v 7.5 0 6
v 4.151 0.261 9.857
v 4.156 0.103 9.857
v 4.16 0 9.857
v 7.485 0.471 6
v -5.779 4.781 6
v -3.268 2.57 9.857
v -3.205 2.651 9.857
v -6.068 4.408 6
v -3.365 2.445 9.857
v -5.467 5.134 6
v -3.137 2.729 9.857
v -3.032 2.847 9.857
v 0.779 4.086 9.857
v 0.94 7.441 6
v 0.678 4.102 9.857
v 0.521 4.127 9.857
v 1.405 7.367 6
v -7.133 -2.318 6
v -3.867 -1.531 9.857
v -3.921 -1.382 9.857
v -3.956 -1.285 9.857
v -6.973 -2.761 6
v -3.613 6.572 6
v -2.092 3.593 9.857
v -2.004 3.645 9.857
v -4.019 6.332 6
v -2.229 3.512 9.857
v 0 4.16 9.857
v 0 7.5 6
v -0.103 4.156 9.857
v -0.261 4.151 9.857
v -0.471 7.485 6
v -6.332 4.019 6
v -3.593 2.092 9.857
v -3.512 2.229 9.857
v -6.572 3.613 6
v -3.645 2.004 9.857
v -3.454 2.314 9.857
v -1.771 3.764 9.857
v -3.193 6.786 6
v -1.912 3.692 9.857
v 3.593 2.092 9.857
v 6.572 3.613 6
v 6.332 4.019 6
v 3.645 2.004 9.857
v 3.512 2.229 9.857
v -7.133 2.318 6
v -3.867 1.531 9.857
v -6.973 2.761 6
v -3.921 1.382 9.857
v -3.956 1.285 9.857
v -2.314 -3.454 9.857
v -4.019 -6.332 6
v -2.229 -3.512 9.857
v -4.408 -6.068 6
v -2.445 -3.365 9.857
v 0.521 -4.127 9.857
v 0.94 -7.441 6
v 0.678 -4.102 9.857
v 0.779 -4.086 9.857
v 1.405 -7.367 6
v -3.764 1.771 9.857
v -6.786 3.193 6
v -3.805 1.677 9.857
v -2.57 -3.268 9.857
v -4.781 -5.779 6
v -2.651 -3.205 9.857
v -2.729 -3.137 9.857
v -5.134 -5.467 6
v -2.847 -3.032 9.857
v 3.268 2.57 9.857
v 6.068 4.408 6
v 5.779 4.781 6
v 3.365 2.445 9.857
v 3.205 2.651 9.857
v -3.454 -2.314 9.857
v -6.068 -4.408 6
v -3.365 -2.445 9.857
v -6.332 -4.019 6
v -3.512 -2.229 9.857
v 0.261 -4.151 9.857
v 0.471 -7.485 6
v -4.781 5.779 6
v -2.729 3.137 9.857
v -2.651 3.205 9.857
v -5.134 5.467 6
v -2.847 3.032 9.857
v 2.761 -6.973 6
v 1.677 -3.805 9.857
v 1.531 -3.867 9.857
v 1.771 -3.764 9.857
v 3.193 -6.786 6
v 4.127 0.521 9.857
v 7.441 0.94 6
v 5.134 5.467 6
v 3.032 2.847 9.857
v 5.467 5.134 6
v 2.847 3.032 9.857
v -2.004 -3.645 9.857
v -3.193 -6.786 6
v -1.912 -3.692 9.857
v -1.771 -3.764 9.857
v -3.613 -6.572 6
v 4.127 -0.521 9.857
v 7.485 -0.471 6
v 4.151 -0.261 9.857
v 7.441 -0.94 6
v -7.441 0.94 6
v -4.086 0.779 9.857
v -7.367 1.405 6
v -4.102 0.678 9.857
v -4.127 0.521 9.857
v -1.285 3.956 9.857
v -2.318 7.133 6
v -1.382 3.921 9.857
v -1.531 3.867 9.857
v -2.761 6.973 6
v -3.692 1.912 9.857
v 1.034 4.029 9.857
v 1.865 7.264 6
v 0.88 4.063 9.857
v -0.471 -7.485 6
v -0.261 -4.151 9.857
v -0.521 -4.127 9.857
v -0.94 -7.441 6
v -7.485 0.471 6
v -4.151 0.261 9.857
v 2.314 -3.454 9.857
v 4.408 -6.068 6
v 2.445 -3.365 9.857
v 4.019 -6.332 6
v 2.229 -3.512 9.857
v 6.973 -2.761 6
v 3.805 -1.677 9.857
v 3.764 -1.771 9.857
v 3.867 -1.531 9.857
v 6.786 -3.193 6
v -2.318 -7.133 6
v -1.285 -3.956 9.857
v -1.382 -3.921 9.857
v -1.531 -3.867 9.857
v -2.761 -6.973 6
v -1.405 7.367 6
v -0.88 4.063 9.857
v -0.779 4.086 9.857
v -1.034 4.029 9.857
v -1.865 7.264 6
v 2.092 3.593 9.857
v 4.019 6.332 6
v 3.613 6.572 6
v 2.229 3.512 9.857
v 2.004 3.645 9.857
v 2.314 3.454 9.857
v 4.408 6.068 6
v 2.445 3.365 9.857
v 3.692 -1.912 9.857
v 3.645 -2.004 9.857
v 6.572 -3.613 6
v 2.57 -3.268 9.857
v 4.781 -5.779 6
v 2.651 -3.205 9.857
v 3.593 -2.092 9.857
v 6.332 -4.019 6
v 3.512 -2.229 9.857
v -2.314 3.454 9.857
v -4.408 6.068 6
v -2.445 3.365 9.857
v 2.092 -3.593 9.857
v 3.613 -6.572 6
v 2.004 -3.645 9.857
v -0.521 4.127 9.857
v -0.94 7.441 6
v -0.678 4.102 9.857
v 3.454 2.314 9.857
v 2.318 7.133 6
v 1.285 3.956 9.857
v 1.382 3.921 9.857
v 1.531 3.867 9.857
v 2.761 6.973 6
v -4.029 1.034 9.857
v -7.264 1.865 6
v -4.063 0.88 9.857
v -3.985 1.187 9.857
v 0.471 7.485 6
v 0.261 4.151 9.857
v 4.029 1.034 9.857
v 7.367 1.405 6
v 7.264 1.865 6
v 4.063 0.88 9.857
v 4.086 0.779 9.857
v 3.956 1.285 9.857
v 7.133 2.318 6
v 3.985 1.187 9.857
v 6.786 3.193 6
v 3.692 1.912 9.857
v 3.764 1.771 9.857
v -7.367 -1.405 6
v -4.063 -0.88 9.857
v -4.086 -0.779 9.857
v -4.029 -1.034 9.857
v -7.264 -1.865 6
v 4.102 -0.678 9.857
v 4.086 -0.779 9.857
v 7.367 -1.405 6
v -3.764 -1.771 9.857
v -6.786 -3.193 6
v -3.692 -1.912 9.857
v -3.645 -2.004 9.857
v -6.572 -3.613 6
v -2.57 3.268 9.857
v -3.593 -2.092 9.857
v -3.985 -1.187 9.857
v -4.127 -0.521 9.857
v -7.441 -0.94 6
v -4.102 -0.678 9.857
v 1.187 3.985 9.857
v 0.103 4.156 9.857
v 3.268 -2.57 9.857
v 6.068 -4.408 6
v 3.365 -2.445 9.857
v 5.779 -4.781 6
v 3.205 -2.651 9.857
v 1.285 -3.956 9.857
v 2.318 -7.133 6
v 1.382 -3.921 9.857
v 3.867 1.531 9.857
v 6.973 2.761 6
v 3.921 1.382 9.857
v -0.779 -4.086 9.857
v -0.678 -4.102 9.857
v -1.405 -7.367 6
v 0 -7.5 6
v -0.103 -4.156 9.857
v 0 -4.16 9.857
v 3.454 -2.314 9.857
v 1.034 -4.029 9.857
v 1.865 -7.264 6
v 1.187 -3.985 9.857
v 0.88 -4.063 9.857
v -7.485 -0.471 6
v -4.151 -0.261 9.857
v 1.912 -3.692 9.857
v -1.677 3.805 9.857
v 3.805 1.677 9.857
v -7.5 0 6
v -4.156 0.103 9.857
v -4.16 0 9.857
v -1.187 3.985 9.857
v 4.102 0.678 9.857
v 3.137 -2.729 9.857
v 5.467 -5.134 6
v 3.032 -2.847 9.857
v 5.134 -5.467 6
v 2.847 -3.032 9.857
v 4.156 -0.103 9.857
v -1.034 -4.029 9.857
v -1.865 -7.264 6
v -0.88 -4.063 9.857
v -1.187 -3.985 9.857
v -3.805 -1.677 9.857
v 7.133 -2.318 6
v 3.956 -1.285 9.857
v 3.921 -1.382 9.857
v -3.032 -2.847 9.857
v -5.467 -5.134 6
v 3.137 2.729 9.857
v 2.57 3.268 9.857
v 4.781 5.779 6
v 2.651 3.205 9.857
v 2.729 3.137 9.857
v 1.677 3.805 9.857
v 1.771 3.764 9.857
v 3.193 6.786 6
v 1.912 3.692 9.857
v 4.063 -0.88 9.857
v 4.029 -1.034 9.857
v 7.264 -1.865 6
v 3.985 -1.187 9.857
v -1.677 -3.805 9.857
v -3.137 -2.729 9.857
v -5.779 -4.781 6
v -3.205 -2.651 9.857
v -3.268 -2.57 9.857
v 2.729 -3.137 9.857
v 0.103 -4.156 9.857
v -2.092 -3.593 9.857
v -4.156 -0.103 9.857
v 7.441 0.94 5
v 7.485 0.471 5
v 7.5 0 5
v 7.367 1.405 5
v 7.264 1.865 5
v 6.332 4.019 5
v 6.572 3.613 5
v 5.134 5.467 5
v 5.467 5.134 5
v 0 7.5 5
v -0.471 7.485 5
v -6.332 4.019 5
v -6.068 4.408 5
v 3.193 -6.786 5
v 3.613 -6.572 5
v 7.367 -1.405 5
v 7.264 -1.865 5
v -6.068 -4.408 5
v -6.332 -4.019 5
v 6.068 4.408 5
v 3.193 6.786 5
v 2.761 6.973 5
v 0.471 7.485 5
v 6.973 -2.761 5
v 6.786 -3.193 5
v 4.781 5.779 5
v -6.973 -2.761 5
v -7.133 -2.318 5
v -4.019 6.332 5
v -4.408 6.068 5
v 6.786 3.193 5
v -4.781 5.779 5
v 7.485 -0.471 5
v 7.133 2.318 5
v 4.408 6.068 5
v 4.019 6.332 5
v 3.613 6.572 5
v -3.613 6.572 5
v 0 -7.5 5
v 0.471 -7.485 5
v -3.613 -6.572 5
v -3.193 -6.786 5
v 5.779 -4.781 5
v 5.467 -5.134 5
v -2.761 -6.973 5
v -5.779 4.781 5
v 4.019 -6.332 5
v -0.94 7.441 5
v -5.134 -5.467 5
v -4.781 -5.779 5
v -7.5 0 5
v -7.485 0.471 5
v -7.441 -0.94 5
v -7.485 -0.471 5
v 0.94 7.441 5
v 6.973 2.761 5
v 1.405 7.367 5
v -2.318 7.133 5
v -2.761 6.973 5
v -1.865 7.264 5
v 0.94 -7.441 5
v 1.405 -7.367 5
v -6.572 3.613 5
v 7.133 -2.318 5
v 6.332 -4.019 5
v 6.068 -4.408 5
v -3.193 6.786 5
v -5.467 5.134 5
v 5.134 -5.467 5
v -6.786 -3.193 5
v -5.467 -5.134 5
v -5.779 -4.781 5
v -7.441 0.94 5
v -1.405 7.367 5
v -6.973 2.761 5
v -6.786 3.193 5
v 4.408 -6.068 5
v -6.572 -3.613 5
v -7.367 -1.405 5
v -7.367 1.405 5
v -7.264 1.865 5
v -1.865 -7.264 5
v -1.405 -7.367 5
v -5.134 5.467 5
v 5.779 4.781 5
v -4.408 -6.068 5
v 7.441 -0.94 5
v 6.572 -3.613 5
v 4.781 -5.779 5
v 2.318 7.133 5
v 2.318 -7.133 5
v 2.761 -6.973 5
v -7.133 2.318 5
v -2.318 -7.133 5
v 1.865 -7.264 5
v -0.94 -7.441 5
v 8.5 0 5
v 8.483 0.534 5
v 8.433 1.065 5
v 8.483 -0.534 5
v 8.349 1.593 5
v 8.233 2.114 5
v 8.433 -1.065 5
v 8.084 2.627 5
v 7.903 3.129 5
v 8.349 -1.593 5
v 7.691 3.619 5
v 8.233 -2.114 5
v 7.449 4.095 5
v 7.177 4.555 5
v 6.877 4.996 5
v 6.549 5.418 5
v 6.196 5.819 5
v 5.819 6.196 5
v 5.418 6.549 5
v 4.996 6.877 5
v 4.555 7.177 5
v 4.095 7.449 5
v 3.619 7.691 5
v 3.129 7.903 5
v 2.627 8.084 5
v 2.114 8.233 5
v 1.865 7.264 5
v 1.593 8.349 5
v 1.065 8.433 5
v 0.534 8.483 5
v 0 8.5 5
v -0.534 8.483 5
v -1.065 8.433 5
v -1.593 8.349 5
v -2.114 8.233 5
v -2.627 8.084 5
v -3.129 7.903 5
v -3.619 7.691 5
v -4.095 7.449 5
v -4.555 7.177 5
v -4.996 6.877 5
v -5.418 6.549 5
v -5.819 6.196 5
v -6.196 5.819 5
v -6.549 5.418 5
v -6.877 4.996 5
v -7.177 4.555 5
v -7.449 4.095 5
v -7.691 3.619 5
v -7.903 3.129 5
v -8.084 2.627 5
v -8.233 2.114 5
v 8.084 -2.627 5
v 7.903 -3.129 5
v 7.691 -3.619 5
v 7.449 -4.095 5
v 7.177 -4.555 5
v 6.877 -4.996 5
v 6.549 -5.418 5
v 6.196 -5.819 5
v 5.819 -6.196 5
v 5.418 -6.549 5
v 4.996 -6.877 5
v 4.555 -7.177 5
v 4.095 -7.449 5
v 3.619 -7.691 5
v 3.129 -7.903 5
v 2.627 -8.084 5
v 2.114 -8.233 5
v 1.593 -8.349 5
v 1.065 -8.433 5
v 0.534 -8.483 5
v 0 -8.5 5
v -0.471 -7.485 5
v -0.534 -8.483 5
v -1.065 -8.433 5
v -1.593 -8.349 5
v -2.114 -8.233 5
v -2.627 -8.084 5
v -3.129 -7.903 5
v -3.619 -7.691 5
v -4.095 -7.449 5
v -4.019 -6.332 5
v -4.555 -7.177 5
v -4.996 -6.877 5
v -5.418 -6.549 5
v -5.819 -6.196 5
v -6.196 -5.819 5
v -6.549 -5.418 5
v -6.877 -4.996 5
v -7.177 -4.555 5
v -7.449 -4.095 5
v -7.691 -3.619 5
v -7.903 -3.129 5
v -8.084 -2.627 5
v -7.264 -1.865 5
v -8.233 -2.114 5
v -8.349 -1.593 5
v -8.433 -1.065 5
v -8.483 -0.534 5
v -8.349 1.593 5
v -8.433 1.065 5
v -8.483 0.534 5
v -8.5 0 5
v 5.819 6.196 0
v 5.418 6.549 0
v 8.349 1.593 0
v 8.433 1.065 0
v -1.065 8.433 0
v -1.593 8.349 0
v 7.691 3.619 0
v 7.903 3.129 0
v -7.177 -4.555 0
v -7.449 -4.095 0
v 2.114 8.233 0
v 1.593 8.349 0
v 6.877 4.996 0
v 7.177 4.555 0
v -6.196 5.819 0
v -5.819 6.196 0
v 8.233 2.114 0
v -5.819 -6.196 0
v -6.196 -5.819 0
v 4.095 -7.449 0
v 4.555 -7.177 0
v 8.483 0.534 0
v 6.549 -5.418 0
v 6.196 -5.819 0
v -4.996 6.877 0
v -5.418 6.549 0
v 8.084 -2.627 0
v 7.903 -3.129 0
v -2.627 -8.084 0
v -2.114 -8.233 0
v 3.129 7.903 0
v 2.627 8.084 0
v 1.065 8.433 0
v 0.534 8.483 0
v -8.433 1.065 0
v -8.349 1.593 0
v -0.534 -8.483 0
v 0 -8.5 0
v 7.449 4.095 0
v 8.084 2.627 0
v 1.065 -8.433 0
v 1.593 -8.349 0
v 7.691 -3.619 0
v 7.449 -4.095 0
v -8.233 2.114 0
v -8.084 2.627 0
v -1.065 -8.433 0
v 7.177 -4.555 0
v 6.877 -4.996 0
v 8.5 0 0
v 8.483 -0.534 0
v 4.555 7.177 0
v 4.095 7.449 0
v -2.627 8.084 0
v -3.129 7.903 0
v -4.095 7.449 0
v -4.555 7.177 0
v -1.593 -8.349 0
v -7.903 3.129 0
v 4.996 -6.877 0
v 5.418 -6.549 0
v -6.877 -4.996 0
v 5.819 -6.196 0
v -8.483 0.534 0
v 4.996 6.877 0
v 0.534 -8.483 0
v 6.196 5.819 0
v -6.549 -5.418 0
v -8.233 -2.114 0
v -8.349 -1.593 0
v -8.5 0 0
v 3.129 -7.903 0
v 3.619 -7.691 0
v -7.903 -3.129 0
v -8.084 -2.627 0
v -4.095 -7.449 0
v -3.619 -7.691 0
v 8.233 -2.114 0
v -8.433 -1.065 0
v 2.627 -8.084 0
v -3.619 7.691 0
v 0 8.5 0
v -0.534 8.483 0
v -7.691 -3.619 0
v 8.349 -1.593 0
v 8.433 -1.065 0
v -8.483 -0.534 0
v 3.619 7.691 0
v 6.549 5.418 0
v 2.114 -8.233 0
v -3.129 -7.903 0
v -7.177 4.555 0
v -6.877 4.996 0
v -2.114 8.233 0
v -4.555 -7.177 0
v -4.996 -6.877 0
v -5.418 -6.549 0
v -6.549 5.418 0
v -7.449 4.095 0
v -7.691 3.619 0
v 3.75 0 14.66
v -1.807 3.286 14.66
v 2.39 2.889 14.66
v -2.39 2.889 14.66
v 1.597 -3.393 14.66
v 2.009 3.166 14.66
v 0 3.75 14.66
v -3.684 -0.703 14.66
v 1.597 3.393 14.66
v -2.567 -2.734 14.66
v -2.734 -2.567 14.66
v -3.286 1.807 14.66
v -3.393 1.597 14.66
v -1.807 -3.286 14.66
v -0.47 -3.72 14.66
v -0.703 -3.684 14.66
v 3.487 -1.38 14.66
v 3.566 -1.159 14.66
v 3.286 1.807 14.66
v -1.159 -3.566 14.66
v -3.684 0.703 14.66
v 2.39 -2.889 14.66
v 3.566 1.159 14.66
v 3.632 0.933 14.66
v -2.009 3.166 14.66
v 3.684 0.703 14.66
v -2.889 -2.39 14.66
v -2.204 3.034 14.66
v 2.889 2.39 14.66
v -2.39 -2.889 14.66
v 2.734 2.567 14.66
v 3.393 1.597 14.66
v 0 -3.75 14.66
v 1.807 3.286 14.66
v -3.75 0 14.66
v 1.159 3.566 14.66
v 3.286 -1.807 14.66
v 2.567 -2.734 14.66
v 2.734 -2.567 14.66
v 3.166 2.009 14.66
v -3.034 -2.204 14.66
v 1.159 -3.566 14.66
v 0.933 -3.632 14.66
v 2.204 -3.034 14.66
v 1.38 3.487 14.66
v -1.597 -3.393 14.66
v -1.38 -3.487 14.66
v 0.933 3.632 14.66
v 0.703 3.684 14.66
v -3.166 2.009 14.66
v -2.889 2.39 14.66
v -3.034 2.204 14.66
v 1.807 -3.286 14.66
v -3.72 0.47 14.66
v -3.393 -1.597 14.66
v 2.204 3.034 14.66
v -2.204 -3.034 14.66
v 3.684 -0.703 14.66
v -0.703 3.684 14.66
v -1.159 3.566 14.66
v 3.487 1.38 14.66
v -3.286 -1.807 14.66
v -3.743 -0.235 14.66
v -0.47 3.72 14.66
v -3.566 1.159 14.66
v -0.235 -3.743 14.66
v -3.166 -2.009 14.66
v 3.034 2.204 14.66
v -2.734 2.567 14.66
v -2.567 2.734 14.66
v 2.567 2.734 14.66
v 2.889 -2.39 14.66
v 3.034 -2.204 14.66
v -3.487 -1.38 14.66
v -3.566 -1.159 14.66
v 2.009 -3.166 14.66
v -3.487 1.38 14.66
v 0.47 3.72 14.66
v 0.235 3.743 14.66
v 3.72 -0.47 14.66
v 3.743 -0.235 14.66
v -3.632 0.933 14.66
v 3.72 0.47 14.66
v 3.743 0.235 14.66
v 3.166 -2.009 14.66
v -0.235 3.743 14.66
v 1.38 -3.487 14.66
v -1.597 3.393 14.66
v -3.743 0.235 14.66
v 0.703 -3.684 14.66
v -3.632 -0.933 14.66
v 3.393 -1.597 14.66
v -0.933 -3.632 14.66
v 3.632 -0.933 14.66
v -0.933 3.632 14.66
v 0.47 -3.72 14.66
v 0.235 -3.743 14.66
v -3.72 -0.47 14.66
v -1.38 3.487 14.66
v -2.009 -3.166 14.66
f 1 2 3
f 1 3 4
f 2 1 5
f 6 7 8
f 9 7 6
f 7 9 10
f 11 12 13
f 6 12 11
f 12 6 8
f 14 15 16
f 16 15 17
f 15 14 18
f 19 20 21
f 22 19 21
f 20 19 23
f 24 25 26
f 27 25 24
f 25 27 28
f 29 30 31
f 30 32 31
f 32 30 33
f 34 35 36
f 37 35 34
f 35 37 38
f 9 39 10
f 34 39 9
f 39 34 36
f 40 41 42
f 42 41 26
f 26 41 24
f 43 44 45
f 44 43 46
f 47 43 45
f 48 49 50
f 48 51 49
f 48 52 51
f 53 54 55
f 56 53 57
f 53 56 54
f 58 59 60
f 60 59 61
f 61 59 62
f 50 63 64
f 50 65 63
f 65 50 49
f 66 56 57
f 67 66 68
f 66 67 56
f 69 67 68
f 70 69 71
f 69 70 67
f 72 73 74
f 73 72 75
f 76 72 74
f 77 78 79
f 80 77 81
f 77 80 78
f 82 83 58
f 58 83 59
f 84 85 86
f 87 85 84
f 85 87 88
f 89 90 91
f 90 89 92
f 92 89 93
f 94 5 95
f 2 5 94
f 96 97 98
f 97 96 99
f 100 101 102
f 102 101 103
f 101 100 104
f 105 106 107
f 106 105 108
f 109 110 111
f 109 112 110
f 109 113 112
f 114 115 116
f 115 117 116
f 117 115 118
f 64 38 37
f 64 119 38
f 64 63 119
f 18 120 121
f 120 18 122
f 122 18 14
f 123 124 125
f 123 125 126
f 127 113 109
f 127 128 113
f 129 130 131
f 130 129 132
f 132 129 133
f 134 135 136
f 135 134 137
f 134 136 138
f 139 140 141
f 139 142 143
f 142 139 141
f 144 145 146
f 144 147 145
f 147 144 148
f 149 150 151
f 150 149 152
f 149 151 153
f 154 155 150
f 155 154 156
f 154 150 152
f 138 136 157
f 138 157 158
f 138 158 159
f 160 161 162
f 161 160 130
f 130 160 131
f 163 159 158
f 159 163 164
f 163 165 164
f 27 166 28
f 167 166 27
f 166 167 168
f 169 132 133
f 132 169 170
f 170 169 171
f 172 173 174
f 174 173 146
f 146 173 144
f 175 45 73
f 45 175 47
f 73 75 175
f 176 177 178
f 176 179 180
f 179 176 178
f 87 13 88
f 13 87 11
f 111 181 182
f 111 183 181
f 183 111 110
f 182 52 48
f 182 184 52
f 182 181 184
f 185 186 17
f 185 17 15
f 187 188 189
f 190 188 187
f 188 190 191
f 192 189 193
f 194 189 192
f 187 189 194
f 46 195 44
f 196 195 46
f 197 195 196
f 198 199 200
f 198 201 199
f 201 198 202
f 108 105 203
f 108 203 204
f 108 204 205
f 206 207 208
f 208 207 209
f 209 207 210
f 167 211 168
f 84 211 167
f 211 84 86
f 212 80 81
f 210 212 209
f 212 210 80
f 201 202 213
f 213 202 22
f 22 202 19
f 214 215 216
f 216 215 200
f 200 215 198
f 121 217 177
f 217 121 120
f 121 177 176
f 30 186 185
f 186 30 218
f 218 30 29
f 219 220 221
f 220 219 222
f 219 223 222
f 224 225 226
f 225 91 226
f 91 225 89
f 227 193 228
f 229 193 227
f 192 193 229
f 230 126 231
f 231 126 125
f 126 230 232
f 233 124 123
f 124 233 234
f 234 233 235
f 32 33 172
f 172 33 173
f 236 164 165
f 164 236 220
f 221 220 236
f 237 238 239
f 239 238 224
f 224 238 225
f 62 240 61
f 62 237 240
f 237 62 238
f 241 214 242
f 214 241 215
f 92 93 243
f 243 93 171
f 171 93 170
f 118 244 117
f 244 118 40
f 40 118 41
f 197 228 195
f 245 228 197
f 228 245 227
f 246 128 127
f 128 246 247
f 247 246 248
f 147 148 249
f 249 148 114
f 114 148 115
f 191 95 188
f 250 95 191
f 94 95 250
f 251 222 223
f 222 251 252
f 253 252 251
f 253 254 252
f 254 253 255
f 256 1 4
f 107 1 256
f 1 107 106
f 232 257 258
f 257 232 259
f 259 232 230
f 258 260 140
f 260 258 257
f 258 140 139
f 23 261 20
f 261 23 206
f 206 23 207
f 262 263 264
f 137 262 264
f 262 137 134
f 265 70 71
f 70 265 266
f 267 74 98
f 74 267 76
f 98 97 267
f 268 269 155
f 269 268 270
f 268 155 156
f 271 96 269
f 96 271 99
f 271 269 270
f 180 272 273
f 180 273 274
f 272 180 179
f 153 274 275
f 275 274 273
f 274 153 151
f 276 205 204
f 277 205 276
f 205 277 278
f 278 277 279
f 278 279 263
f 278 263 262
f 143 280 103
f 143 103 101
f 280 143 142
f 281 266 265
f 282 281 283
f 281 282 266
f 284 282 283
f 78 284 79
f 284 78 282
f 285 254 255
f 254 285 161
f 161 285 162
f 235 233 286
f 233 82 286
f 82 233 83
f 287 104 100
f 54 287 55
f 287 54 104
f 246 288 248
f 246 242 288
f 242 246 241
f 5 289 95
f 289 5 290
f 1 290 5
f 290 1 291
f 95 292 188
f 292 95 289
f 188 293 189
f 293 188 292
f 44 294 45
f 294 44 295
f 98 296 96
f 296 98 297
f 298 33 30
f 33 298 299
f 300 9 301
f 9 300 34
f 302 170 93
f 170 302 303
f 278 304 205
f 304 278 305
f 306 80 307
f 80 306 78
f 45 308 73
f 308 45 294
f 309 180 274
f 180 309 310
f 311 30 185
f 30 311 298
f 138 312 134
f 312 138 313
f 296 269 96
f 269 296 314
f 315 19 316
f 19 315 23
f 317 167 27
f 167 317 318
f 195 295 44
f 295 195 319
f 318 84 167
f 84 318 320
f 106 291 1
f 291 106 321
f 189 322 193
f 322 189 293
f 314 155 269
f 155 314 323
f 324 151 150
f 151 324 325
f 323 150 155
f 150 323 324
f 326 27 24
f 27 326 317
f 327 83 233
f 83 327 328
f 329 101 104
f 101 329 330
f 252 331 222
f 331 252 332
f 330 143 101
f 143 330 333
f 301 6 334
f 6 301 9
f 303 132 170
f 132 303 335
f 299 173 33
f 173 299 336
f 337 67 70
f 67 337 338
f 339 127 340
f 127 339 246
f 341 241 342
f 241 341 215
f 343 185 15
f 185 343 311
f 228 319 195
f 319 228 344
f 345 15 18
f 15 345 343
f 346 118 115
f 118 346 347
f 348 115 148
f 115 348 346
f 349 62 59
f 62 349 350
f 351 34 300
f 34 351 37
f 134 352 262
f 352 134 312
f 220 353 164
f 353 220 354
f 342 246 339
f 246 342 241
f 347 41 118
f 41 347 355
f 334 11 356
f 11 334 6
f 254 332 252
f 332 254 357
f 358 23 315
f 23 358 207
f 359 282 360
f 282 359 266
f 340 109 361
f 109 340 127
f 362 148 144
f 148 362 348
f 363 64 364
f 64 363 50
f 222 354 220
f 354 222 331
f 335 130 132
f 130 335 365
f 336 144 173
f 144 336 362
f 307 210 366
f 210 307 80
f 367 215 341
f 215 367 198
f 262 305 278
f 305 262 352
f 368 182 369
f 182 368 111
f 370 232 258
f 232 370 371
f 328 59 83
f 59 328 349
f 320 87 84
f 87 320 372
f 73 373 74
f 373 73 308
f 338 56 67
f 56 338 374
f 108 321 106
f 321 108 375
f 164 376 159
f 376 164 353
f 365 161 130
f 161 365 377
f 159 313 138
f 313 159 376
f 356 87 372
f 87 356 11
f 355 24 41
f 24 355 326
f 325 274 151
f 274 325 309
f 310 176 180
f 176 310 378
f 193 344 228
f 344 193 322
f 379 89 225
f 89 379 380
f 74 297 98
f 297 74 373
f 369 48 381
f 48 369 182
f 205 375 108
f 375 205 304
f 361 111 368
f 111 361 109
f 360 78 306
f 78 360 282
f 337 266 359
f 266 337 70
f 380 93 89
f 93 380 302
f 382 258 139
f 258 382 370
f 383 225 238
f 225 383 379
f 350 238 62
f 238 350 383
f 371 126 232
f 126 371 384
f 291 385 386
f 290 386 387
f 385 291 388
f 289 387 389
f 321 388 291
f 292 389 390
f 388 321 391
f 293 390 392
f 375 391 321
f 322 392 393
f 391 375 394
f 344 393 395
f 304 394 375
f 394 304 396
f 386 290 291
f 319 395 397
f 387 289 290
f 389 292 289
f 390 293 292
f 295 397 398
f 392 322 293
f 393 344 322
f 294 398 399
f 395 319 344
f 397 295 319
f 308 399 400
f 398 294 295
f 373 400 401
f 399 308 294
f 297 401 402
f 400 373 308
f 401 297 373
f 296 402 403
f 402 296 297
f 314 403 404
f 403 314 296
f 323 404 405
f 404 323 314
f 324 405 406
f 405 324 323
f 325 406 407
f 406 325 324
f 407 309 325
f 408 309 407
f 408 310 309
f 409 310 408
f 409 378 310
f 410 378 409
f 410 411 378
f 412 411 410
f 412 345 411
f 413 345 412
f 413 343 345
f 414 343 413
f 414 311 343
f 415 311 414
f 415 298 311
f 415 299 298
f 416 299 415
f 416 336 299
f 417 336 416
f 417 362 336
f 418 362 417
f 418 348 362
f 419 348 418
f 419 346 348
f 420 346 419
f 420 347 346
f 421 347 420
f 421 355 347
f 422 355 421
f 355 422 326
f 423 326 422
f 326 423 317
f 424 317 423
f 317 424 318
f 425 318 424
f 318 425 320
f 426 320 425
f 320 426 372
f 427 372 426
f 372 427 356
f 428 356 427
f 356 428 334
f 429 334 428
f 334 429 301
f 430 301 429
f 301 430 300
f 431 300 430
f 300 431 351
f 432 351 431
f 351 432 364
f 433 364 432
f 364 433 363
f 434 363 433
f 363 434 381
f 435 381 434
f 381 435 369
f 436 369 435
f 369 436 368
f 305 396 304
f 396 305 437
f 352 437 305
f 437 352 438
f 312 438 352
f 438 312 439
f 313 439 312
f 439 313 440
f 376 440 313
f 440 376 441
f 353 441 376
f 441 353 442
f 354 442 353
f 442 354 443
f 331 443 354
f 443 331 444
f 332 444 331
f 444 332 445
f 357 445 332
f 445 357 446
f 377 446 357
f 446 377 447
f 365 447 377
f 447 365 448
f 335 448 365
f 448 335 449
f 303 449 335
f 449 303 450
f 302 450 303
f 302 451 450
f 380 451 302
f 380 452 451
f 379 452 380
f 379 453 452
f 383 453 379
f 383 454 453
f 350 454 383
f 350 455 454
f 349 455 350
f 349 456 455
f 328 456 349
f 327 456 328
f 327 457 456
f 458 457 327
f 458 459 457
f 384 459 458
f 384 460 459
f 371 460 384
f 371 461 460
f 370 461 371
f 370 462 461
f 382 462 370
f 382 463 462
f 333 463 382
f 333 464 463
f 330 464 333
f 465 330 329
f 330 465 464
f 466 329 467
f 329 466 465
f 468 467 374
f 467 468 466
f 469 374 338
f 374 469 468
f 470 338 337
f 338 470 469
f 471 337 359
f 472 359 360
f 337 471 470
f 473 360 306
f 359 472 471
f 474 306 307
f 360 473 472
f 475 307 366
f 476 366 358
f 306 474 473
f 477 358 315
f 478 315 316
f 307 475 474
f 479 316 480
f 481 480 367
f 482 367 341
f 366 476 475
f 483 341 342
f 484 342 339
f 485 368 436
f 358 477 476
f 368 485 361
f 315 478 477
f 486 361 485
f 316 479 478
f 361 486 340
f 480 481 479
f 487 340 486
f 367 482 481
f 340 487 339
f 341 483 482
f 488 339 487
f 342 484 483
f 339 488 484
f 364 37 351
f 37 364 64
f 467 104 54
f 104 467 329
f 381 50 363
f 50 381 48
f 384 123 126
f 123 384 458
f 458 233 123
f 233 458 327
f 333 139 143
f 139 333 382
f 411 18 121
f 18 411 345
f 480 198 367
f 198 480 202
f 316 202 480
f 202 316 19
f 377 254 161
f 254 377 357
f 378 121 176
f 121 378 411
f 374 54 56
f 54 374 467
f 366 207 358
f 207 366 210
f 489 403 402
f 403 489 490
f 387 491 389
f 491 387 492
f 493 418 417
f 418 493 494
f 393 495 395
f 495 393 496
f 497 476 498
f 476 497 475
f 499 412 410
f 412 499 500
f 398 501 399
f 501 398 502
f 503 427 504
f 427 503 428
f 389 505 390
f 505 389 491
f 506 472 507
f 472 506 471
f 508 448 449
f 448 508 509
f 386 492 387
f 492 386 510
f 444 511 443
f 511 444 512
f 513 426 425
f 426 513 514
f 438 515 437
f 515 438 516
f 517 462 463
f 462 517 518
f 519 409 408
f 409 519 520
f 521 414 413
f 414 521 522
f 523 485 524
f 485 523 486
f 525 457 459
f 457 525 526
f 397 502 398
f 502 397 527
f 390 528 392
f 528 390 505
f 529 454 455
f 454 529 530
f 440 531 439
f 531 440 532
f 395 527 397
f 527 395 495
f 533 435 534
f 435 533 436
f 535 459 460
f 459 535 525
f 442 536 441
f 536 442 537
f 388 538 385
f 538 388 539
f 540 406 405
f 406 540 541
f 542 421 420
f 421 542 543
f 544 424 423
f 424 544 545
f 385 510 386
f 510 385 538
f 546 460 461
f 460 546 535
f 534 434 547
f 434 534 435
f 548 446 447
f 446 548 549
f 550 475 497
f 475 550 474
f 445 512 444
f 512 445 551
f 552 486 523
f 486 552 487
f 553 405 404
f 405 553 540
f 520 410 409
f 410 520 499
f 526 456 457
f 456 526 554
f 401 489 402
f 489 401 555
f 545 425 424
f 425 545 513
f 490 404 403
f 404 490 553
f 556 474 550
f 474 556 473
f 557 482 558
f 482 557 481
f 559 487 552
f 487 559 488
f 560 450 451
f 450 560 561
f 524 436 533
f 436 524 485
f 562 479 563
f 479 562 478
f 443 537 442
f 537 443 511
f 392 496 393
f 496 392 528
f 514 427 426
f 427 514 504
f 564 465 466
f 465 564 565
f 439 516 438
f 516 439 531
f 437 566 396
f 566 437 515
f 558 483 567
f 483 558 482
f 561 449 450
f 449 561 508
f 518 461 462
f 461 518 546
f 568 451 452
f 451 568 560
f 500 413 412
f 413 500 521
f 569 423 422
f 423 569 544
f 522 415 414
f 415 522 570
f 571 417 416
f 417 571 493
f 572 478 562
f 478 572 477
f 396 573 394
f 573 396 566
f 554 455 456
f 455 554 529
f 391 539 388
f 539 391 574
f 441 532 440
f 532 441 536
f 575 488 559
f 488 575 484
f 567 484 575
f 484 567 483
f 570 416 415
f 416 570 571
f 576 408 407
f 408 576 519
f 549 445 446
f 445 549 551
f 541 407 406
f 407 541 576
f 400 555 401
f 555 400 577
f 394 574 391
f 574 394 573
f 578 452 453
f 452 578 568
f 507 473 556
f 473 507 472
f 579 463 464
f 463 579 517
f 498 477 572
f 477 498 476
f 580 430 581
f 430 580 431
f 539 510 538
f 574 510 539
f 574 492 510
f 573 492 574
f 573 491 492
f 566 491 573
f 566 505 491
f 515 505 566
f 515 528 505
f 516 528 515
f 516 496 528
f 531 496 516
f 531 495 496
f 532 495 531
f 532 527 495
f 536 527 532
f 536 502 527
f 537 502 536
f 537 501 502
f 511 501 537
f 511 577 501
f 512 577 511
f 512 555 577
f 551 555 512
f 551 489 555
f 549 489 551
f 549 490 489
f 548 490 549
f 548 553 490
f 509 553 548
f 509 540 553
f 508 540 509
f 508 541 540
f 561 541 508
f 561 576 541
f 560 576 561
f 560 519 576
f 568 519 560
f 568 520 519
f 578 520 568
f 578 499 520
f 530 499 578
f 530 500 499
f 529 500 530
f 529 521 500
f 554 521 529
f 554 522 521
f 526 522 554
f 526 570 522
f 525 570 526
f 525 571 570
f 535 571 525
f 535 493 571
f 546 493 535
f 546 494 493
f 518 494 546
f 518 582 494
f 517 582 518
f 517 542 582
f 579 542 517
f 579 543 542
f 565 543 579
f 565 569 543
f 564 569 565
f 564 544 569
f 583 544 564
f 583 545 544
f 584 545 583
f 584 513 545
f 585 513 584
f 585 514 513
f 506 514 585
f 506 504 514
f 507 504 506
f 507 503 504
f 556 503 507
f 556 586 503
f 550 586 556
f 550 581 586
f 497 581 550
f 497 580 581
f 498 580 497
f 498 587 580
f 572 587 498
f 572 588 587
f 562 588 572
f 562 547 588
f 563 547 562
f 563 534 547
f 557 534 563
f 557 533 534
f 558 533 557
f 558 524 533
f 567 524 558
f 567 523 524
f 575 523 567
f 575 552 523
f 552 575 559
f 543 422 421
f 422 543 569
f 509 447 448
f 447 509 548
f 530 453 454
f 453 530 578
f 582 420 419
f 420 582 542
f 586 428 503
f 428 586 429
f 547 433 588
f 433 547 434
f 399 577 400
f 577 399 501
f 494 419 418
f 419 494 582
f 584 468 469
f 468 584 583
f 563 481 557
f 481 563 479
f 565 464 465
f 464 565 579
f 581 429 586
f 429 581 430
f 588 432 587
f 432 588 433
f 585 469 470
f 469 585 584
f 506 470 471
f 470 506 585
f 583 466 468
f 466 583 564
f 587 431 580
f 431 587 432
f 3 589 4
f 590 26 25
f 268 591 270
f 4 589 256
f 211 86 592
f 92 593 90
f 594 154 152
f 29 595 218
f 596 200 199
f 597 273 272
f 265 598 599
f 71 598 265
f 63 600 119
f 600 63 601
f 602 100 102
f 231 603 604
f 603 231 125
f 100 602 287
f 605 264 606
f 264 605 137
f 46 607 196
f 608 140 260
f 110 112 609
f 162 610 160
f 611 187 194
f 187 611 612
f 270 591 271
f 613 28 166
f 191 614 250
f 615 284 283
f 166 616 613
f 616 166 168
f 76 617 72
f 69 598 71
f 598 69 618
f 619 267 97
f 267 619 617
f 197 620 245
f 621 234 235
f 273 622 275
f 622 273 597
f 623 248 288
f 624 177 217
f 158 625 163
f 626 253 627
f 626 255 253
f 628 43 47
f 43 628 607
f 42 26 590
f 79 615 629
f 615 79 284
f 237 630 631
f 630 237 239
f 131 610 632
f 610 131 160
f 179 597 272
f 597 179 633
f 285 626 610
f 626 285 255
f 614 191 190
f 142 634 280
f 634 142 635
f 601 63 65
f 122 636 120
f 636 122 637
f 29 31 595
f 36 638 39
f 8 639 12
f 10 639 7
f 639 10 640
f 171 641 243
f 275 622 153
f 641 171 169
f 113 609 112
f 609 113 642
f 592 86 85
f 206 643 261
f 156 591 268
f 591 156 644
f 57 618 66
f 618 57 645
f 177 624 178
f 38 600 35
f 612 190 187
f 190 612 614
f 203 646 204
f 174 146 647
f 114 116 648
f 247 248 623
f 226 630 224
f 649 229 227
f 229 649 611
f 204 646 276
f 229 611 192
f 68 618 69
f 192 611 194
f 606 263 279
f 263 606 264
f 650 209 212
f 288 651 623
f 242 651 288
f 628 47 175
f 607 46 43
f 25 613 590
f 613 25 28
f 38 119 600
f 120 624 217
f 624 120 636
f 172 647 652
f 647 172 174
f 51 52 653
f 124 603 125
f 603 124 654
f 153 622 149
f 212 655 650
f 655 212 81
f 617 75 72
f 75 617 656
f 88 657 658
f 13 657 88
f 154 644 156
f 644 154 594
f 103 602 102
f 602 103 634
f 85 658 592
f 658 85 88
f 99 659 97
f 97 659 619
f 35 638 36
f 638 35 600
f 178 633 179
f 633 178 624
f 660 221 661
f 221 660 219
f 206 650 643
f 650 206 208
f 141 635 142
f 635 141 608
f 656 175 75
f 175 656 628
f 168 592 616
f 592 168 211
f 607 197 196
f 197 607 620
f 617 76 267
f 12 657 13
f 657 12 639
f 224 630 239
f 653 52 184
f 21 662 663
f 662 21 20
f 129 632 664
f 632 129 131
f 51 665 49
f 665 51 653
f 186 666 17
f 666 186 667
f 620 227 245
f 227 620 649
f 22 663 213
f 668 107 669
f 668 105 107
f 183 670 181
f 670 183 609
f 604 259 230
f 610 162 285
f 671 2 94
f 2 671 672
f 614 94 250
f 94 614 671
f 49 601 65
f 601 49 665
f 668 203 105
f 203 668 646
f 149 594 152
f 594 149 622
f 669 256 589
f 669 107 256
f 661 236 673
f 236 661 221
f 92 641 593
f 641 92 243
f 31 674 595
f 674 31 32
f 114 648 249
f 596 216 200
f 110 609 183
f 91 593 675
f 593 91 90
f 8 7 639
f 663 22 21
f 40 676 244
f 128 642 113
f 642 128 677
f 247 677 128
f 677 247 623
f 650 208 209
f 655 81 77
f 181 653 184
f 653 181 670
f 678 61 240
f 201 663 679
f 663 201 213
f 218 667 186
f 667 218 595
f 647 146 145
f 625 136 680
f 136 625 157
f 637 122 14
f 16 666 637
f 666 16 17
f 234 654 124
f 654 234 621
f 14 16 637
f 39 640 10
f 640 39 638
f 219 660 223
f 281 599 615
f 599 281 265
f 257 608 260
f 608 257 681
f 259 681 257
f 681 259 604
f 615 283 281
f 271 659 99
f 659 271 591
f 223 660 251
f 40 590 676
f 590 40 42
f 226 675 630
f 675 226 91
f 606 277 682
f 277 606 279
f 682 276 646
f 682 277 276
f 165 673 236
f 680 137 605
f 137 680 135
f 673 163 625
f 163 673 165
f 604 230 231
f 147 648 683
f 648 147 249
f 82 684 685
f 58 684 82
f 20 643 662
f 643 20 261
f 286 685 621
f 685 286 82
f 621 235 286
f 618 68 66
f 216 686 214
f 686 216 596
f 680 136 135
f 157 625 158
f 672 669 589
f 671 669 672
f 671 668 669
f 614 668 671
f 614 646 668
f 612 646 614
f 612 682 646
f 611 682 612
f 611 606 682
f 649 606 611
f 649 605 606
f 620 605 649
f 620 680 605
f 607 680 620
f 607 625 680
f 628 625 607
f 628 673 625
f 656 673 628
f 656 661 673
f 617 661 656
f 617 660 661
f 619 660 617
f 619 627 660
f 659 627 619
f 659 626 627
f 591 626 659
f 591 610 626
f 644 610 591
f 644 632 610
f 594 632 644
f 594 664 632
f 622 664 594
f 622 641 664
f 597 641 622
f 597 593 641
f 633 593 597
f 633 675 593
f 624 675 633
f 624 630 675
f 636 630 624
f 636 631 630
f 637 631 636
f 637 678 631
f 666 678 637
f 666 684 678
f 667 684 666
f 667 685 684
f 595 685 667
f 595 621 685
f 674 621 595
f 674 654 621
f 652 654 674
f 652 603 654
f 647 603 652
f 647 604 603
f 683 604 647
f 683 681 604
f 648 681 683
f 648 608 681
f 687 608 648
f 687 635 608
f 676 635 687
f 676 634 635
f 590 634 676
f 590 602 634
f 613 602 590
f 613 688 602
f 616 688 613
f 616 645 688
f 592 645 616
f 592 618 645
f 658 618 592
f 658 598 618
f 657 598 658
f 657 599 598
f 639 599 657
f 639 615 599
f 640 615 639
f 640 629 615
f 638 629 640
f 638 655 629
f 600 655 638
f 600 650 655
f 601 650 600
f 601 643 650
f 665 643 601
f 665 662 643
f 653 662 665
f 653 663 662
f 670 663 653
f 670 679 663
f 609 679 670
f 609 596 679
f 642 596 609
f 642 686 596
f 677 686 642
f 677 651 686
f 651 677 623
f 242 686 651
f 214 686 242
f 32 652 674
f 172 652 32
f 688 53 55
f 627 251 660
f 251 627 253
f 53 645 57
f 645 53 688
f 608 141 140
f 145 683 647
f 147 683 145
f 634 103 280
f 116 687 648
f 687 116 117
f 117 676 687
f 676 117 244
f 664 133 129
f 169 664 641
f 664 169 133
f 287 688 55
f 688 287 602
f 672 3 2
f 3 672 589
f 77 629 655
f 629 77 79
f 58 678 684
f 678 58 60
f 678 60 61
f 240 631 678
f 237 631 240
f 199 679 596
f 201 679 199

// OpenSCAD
//Internal diameter of motor rocket /mm
ID = 15; //[1:100]
//Angle of nozle
ANGLE = 30; //[1:45]
//Initial nozle clearance
SHOULDER=1; //[0:100]
//Diameter of base
BASE_DIAMETER = 17;//[1:100]
//Height of base
BASE_HEIGHT = 5; //[0:100]

$fn=100;

union(){
translate([0,0,BASE_HEIGHT]){
translate([0,0,SHOULDER]){ 
cylinder(h=ID*tan(ANGLE), r1=ID/2, r2=0);
}
cylinder(h=SHOULDER, r1=ID/2, r2=ID/2);
}
cylinder(h=BASE_HEIGHT, r1=BASE_DIAMETER/2, r2=BASE_DIAMETER/2);
cylinder(h=BASE_HEIGHT+SHOULDER+ID*tan(ANGLE), r1=ID/3, r2=ID/4);
}
